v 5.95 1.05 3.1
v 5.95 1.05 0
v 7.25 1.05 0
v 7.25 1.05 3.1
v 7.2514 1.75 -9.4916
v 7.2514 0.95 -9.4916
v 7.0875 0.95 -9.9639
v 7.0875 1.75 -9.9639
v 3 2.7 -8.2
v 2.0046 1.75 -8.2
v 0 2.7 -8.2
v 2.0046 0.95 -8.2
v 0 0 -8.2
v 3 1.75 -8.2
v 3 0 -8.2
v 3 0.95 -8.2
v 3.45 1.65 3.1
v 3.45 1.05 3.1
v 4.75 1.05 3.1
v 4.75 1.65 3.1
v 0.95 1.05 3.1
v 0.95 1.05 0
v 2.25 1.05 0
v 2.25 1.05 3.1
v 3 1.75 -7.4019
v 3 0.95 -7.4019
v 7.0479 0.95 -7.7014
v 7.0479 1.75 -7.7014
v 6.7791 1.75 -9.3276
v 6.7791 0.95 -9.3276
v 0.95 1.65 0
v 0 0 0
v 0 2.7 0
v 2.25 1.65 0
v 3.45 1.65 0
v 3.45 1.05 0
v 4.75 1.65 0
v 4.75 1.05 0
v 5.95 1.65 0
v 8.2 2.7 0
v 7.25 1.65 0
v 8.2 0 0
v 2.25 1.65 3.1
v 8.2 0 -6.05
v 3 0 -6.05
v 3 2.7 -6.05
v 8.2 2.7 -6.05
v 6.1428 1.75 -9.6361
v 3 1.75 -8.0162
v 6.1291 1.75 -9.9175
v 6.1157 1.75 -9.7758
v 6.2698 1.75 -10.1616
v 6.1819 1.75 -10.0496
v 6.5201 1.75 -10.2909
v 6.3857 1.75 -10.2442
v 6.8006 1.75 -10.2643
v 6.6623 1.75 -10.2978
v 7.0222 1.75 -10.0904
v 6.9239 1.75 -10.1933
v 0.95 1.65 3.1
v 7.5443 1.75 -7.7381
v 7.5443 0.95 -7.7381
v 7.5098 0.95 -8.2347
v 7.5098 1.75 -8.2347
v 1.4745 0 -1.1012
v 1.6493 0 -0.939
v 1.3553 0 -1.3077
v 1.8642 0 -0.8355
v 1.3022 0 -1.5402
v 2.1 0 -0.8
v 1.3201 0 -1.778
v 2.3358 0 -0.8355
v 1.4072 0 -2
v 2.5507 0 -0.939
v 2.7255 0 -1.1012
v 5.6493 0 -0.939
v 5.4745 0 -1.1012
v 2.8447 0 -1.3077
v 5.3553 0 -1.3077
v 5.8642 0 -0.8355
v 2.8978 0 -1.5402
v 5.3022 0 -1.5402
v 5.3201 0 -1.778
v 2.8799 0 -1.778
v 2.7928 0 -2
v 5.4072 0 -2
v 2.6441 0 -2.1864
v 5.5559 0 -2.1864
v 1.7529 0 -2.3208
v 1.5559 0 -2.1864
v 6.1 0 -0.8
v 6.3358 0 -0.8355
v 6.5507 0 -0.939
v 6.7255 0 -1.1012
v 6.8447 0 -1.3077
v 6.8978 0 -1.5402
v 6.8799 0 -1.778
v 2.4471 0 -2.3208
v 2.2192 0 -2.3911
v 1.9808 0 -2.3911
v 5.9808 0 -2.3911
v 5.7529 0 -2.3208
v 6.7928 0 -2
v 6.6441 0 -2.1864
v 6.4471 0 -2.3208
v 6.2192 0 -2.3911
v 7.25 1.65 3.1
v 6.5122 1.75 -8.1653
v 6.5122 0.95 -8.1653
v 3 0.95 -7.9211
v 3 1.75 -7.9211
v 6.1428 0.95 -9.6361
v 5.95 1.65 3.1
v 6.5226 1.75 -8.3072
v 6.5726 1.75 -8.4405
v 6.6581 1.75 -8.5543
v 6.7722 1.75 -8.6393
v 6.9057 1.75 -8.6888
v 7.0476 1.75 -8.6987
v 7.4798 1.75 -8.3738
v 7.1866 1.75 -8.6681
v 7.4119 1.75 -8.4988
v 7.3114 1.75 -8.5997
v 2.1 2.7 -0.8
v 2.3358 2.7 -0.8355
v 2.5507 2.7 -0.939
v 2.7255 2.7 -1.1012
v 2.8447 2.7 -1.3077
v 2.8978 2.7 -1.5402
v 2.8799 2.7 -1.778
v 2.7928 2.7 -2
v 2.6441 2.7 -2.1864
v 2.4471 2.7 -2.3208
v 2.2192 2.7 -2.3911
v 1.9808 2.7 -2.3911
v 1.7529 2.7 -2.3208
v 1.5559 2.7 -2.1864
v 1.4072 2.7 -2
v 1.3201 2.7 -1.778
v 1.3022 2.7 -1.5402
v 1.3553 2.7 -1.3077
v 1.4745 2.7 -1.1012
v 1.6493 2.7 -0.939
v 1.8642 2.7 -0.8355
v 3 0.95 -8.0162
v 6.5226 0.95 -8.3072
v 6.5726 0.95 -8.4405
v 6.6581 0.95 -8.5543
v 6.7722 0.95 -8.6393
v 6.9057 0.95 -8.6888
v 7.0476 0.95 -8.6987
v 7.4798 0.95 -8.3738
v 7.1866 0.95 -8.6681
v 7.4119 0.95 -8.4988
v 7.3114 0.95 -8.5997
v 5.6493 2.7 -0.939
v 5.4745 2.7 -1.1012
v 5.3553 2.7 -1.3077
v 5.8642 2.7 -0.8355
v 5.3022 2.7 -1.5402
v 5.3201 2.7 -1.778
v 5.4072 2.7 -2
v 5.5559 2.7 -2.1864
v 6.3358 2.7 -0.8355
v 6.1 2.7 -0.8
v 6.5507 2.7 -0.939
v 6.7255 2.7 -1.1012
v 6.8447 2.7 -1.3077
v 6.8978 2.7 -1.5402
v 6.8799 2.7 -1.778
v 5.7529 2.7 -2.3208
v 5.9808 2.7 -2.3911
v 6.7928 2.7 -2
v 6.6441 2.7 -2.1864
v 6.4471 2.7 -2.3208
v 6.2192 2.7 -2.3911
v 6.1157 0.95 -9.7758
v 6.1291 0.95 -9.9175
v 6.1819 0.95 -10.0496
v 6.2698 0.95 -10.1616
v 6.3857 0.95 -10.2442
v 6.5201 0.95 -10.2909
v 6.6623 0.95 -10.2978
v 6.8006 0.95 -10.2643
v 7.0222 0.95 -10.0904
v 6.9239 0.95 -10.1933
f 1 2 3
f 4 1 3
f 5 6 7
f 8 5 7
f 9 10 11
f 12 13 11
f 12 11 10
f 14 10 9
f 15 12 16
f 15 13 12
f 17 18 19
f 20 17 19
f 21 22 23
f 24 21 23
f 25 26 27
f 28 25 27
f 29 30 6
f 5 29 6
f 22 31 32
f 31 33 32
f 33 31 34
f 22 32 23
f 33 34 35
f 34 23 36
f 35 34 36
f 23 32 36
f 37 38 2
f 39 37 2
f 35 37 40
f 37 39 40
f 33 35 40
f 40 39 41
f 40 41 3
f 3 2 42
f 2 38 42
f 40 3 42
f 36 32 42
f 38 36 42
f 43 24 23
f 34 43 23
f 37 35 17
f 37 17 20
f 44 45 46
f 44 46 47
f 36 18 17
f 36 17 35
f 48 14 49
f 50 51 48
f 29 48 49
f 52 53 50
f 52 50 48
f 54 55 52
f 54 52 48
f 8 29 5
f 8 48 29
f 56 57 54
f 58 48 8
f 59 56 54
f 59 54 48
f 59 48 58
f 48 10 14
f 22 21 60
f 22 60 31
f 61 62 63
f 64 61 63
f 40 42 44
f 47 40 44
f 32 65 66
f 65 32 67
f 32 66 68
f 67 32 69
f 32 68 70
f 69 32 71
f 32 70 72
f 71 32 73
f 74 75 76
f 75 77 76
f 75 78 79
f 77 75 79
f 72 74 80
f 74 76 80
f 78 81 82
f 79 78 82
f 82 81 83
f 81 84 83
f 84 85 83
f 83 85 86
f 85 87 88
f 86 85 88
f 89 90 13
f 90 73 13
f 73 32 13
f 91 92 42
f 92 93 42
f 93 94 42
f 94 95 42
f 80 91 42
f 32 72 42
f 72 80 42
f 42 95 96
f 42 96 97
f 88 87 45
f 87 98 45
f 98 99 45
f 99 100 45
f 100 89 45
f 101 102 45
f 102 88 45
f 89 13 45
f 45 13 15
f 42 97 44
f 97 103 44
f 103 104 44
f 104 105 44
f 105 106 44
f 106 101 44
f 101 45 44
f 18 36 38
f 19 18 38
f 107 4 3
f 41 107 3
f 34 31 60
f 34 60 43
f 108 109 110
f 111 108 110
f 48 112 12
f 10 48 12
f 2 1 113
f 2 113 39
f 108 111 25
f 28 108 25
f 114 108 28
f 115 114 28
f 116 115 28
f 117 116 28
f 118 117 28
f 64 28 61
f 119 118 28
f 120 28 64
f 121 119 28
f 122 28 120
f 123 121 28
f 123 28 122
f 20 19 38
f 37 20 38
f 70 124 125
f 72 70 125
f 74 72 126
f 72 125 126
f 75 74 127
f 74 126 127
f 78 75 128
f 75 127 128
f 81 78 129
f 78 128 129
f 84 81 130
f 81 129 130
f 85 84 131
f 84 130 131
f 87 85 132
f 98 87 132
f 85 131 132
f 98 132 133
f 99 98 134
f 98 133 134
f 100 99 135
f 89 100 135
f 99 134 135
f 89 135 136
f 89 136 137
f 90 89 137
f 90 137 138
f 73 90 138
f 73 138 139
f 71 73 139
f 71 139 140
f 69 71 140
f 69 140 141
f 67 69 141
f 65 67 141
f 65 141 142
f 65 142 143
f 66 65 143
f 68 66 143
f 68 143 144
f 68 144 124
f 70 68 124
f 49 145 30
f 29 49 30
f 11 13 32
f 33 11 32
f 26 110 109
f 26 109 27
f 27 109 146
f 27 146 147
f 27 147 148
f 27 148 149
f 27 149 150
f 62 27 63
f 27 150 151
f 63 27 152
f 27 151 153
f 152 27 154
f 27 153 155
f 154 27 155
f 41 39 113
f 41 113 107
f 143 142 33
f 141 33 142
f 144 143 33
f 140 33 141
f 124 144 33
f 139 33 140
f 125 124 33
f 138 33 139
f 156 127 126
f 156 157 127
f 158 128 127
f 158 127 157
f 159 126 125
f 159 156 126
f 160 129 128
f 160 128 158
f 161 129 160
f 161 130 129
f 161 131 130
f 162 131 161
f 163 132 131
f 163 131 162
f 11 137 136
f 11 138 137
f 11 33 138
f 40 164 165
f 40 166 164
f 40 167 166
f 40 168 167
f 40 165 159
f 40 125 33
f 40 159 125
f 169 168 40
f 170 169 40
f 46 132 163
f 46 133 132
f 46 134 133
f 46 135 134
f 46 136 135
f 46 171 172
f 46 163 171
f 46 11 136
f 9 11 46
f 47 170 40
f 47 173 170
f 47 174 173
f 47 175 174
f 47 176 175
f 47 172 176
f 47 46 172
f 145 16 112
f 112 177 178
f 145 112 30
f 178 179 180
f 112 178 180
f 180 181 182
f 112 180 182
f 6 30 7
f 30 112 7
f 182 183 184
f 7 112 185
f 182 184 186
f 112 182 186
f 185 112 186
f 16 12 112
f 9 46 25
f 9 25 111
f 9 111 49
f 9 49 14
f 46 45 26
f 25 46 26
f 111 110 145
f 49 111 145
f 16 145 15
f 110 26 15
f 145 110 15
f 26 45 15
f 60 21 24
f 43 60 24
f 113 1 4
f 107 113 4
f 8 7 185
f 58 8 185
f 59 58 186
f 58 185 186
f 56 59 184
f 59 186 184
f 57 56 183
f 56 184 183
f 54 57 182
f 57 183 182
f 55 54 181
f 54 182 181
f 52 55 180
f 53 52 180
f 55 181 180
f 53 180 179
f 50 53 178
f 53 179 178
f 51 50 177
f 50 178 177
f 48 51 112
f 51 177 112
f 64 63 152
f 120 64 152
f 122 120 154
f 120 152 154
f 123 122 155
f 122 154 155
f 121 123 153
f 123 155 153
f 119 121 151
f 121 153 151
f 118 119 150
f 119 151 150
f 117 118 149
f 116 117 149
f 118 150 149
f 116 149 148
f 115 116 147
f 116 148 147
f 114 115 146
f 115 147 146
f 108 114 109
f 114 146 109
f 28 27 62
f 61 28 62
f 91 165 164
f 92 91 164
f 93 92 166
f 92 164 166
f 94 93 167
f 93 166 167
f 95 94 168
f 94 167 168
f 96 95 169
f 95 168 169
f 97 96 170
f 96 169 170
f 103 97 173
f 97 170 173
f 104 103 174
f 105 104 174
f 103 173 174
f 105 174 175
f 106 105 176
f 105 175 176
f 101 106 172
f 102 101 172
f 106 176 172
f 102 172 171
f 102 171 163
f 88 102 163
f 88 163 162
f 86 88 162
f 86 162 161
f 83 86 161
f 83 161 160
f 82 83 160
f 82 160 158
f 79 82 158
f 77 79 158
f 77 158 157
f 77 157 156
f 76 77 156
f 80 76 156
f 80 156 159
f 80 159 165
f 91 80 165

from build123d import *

# Parameters (mm, degrees)
SKETCH1_W                 = 3
SKETCH1_H                 = 2.15
SKETCH1_W_2               = 8.2
SKETCH1_H_2               = 6.05
BODY_DEPTH                = 2.7
PINS_DEPTH                = 0.3
PINS_DEPTH_BACK           = 0.3
SKETCH2_W                 = 1.3
SKETCH2_H                 = 3.1
SKETCH3_R                 = 0.8
M1_6HOLES_DEPTH           = 12.906720791
FREEPOSITION_DEPTH        = 0.4
FREEPOSITION_DEPTH_BACK   = 0.4
OPERATINGPOINT_DEPTH      = 0.4
OPERATINGPOINT_DEPTH_BACK = 0.4


with BuildPart() as part:
    # Sketch1 → Body (new body)
    with BuildSketch(Plane(origin=(0, 0, 0), x_dir=(1, 0, 0), z_dir=(0, 1, 0))):
        with Locations((1.5, 7.125)):
            Rectangle(SKETCH1_W, SKETCH1_H)
        with Locations((4.1, 3.025)):
            Rectangle(SKETCH1_W_2, SKETCH1_H_2)
    extrude(amount=BODY_DEPTH)

    # Sketch2 → Pins (add, two sides: drawn at the far end of the back side and taken through both)
    with BuildSketch(Plane(origin=(0, 1.35, 0), x_dir=(1, 0, 0), z_dir=(0, 1, 0)).offset(-PINS_DEPTH_BACK)):
        with Locations((1.6, -1.55)):
            Rectangle(SKETCH2_W, SKETCH2_H)
        with Locations((4.1, -1.55)):
            Rectangle(SKETCH2_W, SKETCH2_H)
        with Locations((6.6, -1.55)):
            Rectangle(SKETCH2_W, SKETCH2_H)
    extrude(amount=PINS_DEPTH + PINS_DEPTH_BACK)

    # Sketch3 → M1.6Holes (cut, through all)
    with BuildSketch(Plane(origin=(0, 2.7, 0), x_dir=(1, 0, 0), z_dir=(0, 1, 0))):
        with Locations(Location((2.1, 1.6, 0), (0, 0, 270))):
            Circle(SKETCH3_R)
        with Locations(Location((6.1, 1.6, 0), (0, 0, 270))):
            Circle(SKETCH3_R)
    extrude(amount=-M1_6HOLES_DEPTH, mode=Mode.SUBTRACT)

    # Sketch4 → FreePosition (add, two sides: drawn at the far end of the back side and taken through both)
    with BuildSketch(Plane(origin=(0, 1.35, 0), x_dir=(1, 0, 0), z_dir=(0, 1, 0)).offset(-FREEPOSITION_DEPTH_BACK)):
        with BuildLine():
            ThreePointArc((7.115151319, 9.8), (7.022559042, 9.510139779), (6.779075529, 9.32763483))
            Line((6.779075529, 9.32763483), (7.251440659, 9.491558958))
            Line((7.251440659, 9.491558958), (7.08751651, 9.963924149))
            ThreePointArc((7.08751651, 9.963924149), (7.108194216, 9.883118604), (7.115151319, 9.8))
        make_face()
        with BuildLine():
            ThreePointArc((6.142786129, 9.636075851), (6.146132258, 9.626733962), (6.149663119, 9.617460317))
            Line((6.149663119, 9.617460317), (6.615151319, 9.8))
            Line((6.615151319, 9.8), (6.142786129, 9.636075851))
        make_face()
        with BuildLine():
            Line((6.615151319, 9.8), (6.149663119, 9.617460317))
            ThreePointArc((6.149663119, 9.617460317), (6.40602238, 9.345835837), (6.779075529, 9.32763483))
            ThreePointArc((6.779075529, 9.32763483), (7.022559042, 9.510139779), (7.115151319, 9.8))
            ThreePointArc((7.115151319, 9.8), (7.108194216, 9.883118604), (7.08751651, 9.963924149))
            ThreePointArc((7.08751651, 9.963924149), (6.45122717, 10.272365191), (6.142786129, 9.636075851))
            Line((6.142786129, 9.636075851), (6.615151319, 9.8))
        make_face()
        with BuildLine():
            Line((6.149663119, 9.617460317), (0.75, 7.5))
            Line((0.75, 7.5), (0.75, 7.235374235))
            Line((0.75, 7.235374235), (6.779075529, 9.32763483))
            ThreePointArc((6.779075529, 9.32763483), (6.40602238, 9.345835837), (6.149663119, 9.617460317))
        make_face()
        with BuildLine():
            Line((0.75, 7.764625765), (0.75, 7.5))
            Line((0.75, 7.5), (6.149663119, 9.617460317))
            ThreePointArc((6.149663119, 9.617460317), (6.146132258, 9.626733962), (6.142786129, 9.636075851))
            Line((6.142786129, 9.636075851), (0.75, 7.764625765))
        make_face()
    extrude(amount=FREEPOSITION_DEPTH + FREEPOSITION_DEPTH_BACK)

    # Sketch5 → OperatingPoint (add, two sides: drawn at the far end of the back side and taken through both)
    with BuildSketch(Plane(origin=(0, 1.35, 0), x_dir=(1, 0, 0), z_dir=(0, 1, 0)).offset(-OPERATINGPOINT_DEPTH_BACK)):
        with BuildLine():
            Line((0.75, 7.764625765), (0.75, 7.235374235))
            Line((0.75, 7.235374235), (7.047885091, 7.701363081))
            ThreePointArc((7.047885091, 7.701363081), (6.6836512, 7.822046181), (6.51219484, 8.165314959))
            Line((6.51219484, 8.165314959), (0.75, 7.764625765))
        make_face()
        with BuildLine():
            ThreePointArc((7.510990337, 8.2), (7.377355849, 7.859740817), (7.047885091, 7.701363081))
            Line((7.047885091, 7.701363081), (7.544317529, 7.738094773))
            Line((7.544317529, 7.738094773), (7.509785834, 8.234685041))
            ThreePointArc((7.509785834, 8.234685041), (7.510689121, 8.217352975), (7.510990337, 8.2))
        make_face()
        with BuildLine():
            ThreePointArc((6.51219484, 8.165314959), (6.6836512, 7.822046181), (7.047885091, 7.701363081))
            ThreePointArc((7.047885091, 7.701363081), (7.377355849, 7.859740817), (7.510990337, 8.2))
            ThreePointArc((7.510990337, 8.2), (7.510689121, 8.217352975), (7.509785834, 8.234685041))
            Line((7.509785834, 8.234685041), (7.010990337, 8.2))
            Line((7.010990337, 8.2), (6.51219484, 8.165314959))
        make_face()
        with BuildLine():
            ThreePointArc((7.509785834, 8.234685041), (6.976305296, 8.698795497), (6.51219484, 8.165314959))
            Line((6.51219484, 8.165314959), (7.010990337, 8.2))
            Line((7.010990337, 8.2), (7.509785834, 8.234685041))
        make_face()
    extrude(amount=OPERATINGPOINT_DEPTH + OPERATINGPOINT_DEPTH_BACK)


solid = part.part
